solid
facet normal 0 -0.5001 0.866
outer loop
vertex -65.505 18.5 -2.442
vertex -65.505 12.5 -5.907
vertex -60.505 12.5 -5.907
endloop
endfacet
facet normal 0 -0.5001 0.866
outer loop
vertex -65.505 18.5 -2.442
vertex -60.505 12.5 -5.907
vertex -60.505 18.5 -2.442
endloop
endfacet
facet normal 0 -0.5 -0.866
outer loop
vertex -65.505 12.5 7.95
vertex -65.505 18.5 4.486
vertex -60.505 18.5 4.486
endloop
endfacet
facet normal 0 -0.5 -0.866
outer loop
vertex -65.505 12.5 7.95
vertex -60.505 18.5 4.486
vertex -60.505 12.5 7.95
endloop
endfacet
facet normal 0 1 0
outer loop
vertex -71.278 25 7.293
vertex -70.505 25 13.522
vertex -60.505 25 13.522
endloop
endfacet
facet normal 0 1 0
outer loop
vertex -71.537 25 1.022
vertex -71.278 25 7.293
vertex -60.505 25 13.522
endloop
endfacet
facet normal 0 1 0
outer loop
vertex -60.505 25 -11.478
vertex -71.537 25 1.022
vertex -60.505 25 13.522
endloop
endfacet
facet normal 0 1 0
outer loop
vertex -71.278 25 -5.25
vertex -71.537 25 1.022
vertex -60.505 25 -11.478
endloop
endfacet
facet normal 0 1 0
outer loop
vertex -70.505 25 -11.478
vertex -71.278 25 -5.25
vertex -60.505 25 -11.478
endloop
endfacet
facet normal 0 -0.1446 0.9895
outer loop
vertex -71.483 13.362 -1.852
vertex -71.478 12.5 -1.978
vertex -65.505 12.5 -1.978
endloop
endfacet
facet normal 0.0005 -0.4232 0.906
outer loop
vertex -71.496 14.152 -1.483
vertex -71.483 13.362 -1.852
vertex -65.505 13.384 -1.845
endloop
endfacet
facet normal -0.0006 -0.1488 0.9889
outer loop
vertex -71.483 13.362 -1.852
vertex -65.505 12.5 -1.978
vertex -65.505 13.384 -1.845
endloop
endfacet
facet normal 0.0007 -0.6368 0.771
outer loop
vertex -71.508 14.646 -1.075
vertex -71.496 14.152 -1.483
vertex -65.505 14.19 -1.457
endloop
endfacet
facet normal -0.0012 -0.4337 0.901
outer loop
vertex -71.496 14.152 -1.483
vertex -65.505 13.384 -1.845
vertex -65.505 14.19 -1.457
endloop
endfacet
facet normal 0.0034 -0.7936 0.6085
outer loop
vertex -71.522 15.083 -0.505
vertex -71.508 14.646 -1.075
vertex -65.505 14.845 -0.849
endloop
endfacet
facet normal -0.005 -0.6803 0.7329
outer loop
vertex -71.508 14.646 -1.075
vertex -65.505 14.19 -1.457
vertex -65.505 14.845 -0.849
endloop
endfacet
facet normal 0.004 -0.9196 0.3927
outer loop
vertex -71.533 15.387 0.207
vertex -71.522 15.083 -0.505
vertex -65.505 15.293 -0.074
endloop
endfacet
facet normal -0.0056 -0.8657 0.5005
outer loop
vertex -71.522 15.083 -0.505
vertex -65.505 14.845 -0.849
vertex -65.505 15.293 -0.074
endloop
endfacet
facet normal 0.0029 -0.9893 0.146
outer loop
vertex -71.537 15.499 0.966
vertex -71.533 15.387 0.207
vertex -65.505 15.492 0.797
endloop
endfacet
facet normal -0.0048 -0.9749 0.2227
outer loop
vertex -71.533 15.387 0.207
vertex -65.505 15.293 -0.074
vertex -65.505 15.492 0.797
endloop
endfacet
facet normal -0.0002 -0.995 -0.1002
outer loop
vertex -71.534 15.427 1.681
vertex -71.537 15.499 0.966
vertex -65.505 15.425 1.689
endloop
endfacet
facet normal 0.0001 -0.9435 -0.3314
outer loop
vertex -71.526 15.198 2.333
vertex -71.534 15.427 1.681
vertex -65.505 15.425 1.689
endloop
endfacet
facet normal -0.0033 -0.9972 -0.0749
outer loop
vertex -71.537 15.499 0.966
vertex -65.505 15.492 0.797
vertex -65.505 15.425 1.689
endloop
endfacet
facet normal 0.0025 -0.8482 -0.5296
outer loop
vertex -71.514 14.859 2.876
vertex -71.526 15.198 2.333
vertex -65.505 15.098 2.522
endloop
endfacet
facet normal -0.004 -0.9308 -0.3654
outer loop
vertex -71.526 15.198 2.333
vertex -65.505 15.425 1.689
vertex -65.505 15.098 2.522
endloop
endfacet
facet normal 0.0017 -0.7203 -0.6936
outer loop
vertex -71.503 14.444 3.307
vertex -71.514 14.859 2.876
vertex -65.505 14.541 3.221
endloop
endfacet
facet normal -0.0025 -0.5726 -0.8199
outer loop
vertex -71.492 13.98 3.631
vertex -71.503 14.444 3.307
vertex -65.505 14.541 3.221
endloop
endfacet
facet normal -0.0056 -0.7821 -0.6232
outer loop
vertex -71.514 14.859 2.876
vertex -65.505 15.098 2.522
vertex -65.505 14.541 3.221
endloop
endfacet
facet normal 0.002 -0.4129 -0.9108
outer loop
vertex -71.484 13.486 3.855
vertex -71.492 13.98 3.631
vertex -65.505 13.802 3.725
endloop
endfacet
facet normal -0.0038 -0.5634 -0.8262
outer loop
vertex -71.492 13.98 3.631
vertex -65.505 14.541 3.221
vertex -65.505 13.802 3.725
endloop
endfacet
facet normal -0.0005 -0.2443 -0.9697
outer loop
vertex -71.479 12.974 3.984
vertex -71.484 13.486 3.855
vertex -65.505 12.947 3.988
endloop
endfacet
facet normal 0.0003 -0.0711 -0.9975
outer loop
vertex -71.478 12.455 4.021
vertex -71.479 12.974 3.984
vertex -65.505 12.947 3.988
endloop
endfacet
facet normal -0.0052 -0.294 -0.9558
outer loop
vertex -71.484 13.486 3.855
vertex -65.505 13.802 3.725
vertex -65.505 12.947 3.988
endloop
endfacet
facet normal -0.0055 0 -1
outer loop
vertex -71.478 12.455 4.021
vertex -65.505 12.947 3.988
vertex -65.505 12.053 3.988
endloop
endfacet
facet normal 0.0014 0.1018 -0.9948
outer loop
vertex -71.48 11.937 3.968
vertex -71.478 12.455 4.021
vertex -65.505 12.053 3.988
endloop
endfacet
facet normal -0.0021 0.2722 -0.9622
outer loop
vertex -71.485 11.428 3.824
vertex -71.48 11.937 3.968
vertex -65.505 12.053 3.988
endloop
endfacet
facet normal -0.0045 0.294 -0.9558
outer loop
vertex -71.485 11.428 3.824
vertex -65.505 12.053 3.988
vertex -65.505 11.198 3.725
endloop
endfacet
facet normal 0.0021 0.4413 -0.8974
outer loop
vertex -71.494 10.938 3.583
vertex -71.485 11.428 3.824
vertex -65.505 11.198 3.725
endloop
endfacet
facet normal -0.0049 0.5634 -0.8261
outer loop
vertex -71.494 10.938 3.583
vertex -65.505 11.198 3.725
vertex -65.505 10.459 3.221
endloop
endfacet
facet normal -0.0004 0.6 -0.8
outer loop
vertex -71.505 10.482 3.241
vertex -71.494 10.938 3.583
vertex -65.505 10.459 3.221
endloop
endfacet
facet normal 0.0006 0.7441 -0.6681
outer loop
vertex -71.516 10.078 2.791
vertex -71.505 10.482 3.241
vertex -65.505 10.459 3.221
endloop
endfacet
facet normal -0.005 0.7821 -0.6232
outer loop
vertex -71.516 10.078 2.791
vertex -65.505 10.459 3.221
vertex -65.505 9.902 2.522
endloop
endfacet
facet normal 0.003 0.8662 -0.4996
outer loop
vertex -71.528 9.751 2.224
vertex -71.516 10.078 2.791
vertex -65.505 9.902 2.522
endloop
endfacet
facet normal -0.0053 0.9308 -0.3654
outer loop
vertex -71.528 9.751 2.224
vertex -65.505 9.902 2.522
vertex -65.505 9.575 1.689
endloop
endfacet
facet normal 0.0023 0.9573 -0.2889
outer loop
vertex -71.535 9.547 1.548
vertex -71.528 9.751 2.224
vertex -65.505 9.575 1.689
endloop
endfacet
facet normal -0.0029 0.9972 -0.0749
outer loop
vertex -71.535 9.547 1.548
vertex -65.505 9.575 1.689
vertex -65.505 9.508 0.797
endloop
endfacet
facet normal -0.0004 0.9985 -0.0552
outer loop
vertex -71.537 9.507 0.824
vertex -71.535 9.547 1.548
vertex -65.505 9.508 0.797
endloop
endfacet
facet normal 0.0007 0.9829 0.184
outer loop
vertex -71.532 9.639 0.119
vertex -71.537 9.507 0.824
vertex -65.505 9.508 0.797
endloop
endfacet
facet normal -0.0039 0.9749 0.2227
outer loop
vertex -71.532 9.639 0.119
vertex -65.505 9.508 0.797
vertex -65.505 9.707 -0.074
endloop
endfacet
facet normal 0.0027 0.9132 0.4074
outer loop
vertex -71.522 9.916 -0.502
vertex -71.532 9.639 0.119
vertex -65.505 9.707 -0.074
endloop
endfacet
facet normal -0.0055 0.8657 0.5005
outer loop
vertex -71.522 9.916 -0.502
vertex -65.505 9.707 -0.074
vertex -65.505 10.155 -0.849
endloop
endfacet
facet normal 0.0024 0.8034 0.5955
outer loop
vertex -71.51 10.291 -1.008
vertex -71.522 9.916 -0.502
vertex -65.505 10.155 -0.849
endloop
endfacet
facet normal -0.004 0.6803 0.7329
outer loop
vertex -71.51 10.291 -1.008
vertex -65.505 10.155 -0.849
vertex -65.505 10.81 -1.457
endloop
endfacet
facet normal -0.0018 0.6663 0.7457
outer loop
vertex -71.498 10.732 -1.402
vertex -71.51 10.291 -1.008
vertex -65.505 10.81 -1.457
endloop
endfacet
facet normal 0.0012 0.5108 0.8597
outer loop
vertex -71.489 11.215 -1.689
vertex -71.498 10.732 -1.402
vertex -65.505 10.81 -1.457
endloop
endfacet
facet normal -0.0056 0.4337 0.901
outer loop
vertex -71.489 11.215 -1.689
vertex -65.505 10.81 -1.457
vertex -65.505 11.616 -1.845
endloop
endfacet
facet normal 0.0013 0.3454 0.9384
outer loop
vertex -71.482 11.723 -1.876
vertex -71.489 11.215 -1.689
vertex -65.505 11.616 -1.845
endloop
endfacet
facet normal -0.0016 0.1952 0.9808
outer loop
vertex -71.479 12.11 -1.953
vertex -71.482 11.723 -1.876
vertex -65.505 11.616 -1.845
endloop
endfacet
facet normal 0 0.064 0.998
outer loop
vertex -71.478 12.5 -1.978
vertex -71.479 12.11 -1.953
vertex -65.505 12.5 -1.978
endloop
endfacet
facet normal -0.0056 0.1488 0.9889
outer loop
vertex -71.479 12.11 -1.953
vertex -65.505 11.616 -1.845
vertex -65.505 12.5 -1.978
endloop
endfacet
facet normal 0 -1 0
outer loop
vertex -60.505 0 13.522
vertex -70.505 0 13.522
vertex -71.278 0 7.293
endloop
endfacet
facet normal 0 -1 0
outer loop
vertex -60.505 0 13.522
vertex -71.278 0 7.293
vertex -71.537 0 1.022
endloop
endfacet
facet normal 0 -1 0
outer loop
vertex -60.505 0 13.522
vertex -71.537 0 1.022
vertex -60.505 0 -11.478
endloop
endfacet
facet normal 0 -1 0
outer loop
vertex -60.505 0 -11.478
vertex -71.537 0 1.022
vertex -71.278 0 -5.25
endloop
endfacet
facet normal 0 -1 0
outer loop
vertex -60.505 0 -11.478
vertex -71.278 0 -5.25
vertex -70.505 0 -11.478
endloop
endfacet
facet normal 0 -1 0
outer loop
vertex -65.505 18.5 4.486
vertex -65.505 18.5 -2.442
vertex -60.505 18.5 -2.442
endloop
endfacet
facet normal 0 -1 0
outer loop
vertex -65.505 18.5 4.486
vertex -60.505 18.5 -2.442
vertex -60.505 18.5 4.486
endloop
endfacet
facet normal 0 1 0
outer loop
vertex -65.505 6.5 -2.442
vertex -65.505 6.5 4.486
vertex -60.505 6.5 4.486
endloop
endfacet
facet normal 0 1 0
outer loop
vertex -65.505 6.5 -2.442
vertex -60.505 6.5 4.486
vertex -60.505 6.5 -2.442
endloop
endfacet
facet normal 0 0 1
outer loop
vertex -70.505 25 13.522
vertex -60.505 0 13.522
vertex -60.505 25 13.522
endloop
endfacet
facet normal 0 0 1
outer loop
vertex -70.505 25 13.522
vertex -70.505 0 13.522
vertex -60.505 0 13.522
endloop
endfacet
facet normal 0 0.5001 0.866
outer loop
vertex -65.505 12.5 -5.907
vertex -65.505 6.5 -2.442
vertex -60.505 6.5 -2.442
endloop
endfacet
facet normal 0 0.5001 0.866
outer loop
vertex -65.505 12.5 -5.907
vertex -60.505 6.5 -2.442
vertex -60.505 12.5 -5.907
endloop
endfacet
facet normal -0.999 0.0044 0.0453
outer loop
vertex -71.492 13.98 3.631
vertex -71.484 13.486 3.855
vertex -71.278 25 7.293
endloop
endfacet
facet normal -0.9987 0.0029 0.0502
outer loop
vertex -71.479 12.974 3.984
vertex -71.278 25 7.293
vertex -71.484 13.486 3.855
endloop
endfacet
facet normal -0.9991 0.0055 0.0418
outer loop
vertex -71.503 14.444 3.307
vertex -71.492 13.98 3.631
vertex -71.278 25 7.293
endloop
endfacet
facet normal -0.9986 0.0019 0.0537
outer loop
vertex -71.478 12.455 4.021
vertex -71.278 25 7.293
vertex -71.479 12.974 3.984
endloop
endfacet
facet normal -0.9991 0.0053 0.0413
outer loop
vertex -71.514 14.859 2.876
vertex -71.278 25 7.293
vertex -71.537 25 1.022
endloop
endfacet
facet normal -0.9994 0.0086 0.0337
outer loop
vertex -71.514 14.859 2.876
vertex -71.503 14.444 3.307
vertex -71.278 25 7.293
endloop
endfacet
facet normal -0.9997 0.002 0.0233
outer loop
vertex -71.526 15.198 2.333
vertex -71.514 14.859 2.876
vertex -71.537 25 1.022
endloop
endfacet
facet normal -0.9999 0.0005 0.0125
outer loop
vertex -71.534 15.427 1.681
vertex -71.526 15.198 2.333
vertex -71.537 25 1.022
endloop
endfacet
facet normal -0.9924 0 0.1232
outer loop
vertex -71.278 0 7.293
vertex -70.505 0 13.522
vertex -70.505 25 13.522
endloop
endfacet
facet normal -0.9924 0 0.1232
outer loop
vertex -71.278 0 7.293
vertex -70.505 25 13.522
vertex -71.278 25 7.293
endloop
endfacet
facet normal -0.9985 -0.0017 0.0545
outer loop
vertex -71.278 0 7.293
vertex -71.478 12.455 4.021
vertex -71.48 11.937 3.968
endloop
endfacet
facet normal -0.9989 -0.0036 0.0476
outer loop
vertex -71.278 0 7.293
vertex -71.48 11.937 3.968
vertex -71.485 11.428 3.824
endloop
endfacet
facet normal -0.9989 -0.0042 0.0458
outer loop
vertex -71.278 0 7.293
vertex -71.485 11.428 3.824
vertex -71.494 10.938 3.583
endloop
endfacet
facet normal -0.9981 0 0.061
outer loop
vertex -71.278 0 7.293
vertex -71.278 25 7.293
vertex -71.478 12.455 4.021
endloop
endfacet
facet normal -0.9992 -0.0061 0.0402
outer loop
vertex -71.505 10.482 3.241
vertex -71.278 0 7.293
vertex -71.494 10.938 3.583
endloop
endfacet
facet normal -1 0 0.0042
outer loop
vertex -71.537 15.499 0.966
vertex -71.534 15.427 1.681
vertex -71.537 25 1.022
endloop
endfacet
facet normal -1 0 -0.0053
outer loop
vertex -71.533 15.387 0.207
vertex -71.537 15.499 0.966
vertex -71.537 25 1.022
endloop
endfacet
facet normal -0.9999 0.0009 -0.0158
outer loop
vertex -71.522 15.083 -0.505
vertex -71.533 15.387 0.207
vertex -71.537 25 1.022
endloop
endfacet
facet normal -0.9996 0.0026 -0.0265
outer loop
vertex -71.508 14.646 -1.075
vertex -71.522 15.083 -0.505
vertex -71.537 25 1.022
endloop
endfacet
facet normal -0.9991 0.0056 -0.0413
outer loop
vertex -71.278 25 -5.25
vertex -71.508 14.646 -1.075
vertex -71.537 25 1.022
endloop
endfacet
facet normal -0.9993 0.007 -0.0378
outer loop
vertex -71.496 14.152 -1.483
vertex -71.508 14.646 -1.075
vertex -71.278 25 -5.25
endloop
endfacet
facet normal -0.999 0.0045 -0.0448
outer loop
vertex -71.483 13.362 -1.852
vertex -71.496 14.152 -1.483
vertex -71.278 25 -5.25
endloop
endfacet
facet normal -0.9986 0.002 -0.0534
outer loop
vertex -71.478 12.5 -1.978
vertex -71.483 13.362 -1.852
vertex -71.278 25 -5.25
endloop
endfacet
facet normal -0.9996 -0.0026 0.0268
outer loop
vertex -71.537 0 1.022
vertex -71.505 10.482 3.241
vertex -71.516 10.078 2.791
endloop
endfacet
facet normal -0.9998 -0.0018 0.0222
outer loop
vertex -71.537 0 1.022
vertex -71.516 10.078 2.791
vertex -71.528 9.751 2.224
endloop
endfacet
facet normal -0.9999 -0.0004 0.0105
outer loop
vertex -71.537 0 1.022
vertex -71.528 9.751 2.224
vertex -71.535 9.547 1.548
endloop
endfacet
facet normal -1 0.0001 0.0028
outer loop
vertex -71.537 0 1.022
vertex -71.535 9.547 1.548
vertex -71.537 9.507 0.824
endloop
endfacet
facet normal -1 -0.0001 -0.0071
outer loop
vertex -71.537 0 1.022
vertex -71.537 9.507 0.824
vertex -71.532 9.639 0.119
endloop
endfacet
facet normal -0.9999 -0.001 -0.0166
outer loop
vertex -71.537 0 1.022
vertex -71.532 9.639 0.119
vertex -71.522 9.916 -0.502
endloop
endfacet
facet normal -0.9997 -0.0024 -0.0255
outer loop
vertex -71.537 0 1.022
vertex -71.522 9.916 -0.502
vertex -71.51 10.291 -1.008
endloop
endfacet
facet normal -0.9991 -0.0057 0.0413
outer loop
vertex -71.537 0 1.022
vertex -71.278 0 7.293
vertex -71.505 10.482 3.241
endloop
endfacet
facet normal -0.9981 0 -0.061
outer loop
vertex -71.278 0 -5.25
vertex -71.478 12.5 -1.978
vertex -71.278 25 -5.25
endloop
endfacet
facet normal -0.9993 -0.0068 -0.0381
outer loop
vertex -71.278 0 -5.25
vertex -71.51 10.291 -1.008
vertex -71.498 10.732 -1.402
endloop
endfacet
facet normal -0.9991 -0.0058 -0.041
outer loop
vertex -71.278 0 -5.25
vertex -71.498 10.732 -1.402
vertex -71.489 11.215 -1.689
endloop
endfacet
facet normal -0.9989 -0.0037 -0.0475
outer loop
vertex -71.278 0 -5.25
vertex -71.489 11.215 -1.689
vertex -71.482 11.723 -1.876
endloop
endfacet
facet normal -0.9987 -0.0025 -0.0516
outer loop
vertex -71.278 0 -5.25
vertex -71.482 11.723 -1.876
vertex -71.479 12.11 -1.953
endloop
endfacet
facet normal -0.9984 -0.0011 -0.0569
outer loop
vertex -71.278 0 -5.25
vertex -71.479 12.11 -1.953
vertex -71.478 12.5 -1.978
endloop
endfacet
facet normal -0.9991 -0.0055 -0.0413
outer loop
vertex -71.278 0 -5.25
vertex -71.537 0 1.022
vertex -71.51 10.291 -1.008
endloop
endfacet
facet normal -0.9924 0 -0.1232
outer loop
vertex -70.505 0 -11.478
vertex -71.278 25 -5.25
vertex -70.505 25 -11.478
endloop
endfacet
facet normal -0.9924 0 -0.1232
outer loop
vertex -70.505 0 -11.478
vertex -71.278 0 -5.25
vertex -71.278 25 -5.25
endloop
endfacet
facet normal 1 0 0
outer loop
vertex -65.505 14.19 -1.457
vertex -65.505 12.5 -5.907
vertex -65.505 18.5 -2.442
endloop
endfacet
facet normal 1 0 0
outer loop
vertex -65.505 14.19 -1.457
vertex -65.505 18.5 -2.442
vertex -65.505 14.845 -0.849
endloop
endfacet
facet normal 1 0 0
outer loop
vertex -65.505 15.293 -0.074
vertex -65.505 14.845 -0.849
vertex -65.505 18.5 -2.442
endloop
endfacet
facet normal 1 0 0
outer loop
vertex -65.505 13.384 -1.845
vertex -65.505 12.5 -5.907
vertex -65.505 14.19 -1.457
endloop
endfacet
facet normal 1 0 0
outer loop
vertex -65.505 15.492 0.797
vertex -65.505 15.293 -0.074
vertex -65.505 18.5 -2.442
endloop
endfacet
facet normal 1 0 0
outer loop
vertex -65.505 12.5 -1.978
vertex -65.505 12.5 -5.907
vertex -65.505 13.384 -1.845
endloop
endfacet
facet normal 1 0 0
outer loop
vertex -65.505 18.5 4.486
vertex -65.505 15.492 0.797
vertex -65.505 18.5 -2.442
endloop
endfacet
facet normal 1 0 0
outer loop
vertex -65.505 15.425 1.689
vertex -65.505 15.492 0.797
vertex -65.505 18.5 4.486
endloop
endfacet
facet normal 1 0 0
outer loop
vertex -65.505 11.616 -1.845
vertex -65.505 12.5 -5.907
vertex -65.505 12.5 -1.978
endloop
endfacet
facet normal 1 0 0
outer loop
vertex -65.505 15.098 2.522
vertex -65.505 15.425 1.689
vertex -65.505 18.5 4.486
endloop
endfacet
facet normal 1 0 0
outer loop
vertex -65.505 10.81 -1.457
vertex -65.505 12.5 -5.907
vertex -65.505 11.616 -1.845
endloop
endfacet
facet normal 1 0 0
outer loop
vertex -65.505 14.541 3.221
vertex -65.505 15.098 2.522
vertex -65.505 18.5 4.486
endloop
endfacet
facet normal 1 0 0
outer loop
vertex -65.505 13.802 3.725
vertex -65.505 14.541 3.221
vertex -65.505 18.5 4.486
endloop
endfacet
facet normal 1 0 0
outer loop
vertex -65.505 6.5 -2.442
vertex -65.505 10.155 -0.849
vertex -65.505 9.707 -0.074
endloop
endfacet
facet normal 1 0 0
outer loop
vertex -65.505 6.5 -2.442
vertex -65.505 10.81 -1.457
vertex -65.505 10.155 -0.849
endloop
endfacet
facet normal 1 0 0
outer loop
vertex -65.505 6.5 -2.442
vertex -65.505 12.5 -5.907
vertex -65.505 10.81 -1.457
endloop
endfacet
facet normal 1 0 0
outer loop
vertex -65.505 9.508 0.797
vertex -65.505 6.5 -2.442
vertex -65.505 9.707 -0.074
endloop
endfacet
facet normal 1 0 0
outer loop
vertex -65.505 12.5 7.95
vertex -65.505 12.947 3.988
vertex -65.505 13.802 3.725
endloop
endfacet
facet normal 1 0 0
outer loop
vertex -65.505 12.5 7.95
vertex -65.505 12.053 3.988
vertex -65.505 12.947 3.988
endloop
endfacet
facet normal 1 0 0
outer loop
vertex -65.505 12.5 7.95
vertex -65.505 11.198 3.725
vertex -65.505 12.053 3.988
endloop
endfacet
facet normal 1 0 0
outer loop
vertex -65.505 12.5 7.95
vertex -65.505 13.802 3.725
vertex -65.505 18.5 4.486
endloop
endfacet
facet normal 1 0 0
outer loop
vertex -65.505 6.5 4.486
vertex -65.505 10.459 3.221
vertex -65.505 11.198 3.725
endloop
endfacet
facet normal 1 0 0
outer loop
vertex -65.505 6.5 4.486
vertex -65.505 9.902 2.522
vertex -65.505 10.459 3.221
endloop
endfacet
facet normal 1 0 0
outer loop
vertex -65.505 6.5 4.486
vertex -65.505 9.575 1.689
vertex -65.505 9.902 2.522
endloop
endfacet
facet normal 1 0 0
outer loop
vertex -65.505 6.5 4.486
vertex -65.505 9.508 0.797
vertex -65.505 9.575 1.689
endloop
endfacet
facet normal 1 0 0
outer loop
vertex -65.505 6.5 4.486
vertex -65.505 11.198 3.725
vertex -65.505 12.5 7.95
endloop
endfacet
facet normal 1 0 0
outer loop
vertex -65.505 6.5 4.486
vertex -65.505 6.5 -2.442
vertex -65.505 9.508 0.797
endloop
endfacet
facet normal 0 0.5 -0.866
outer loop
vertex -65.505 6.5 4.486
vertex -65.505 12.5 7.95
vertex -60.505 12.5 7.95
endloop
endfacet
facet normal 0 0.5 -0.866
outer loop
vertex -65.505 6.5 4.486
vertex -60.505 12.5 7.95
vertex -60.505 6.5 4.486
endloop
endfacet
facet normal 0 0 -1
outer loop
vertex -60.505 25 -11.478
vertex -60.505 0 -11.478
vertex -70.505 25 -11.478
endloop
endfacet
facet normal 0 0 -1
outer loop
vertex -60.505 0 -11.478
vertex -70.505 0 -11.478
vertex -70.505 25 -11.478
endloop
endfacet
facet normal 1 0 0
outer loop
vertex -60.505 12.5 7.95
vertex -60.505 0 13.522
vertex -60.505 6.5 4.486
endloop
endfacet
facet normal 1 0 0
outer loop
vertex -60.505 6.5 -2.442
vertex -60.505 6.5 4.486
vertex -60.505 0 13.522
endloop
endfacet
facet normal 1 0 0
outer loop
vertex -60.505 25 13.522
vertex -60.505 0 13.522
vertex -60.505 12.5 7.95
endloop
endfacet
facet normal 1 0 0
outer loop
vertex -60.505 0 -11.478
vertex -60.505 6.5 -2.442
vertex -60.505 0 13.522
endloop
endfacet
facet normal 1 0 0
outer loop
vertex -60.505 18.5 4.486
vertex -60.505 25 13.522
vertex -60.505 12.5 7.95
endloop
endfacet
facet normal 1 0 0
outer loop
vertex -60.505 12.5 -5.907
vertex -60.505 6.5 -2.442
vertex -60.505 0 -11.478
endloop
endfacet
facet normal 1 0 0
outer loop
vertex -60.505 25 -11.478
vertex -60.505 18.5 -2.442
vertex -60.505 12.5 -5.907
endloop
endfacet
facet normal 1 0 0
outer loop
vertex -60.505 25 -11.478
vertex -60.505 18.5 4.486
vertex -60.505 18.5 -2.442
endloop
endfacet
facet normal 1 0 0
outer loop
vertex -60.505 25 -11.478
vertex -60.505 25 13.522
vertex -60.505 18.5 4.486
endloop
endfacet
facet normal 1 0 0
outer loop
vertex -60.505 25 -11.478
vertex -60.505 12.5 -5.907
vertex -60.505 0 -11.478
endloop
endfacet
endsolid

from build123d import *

# Parameters (mm, degrees)
BOSS_EXTRUDE1_DEPTH = 25
SKETCH2_R           = 3
CUT_EXTRUDE1_DEPTH  = 25
SKETCH3_W           = 25
SKETCH3_H           = 25
BOSS_EXTRUDE2_DEPTH = 5


with BuildPart() as part:
    # Sketch1 → Boss-Extrude1 (new body)
    with BuildSketch(Plane(origin=(0, 0, 0), x_dir=(1, 0, 0), z_dir=(0, 1, 0))):
        with BuildLine():
            Line((-65.504745346, 11.478381524), (-65.504745346, -13.521618476))
            Line((-65.504745346, -13.521618476), (-70.504745346, -13.521618476))
            ThreePointArc((-70.504745346, -13.521618476), (-71.536999603, -1.021618476), (-70.504745346, 11.478381524))
            Line((-70.504745346, 11.478381524), (-65.504745346, 11.478381524))
        make_face()
    extrude(amount=BOSS_EXTRUDE1_DEPTH)

    # Sketch2 → Cut-Extrude1 (cut)
    with BuildSketch(Plane(origin=(-65.504745346, 0, 0), x_dir=(0, 0, -1), z_dir=(1, 0, 0))):
        with Locations((-1.021618476, 12.5)):
            Circle(SKETCH2_R)
    extrude(amount=-CUT_EXTRUDE1_DEPTH, mode=Mode.SUBTRACT)

    # Sketch3 → Boss-Extrude2 (add)
    with BuildSketch(Plane(origin=(-65.504745346, 0, 0), x_dir=(0, 0, -1), z_dir=(1, 0, 0))):
        with Locations((-1.021618476, 12.5)):
            Rectangle(SKETCH3_W, SKETCH3_H)
        Polygon((5.906584755, 12.5), (2.442483139, 18.5), (-4.485720091, 18.5), (-7.949821706, 12.5), (-4.485720091, 6.5), (2.442483139, 6.5), align=None, mode=Mode.SUBTRACT)
    extrude(amount=BOSS_EXTRUDE2_DEPTH)


solid = part.part
